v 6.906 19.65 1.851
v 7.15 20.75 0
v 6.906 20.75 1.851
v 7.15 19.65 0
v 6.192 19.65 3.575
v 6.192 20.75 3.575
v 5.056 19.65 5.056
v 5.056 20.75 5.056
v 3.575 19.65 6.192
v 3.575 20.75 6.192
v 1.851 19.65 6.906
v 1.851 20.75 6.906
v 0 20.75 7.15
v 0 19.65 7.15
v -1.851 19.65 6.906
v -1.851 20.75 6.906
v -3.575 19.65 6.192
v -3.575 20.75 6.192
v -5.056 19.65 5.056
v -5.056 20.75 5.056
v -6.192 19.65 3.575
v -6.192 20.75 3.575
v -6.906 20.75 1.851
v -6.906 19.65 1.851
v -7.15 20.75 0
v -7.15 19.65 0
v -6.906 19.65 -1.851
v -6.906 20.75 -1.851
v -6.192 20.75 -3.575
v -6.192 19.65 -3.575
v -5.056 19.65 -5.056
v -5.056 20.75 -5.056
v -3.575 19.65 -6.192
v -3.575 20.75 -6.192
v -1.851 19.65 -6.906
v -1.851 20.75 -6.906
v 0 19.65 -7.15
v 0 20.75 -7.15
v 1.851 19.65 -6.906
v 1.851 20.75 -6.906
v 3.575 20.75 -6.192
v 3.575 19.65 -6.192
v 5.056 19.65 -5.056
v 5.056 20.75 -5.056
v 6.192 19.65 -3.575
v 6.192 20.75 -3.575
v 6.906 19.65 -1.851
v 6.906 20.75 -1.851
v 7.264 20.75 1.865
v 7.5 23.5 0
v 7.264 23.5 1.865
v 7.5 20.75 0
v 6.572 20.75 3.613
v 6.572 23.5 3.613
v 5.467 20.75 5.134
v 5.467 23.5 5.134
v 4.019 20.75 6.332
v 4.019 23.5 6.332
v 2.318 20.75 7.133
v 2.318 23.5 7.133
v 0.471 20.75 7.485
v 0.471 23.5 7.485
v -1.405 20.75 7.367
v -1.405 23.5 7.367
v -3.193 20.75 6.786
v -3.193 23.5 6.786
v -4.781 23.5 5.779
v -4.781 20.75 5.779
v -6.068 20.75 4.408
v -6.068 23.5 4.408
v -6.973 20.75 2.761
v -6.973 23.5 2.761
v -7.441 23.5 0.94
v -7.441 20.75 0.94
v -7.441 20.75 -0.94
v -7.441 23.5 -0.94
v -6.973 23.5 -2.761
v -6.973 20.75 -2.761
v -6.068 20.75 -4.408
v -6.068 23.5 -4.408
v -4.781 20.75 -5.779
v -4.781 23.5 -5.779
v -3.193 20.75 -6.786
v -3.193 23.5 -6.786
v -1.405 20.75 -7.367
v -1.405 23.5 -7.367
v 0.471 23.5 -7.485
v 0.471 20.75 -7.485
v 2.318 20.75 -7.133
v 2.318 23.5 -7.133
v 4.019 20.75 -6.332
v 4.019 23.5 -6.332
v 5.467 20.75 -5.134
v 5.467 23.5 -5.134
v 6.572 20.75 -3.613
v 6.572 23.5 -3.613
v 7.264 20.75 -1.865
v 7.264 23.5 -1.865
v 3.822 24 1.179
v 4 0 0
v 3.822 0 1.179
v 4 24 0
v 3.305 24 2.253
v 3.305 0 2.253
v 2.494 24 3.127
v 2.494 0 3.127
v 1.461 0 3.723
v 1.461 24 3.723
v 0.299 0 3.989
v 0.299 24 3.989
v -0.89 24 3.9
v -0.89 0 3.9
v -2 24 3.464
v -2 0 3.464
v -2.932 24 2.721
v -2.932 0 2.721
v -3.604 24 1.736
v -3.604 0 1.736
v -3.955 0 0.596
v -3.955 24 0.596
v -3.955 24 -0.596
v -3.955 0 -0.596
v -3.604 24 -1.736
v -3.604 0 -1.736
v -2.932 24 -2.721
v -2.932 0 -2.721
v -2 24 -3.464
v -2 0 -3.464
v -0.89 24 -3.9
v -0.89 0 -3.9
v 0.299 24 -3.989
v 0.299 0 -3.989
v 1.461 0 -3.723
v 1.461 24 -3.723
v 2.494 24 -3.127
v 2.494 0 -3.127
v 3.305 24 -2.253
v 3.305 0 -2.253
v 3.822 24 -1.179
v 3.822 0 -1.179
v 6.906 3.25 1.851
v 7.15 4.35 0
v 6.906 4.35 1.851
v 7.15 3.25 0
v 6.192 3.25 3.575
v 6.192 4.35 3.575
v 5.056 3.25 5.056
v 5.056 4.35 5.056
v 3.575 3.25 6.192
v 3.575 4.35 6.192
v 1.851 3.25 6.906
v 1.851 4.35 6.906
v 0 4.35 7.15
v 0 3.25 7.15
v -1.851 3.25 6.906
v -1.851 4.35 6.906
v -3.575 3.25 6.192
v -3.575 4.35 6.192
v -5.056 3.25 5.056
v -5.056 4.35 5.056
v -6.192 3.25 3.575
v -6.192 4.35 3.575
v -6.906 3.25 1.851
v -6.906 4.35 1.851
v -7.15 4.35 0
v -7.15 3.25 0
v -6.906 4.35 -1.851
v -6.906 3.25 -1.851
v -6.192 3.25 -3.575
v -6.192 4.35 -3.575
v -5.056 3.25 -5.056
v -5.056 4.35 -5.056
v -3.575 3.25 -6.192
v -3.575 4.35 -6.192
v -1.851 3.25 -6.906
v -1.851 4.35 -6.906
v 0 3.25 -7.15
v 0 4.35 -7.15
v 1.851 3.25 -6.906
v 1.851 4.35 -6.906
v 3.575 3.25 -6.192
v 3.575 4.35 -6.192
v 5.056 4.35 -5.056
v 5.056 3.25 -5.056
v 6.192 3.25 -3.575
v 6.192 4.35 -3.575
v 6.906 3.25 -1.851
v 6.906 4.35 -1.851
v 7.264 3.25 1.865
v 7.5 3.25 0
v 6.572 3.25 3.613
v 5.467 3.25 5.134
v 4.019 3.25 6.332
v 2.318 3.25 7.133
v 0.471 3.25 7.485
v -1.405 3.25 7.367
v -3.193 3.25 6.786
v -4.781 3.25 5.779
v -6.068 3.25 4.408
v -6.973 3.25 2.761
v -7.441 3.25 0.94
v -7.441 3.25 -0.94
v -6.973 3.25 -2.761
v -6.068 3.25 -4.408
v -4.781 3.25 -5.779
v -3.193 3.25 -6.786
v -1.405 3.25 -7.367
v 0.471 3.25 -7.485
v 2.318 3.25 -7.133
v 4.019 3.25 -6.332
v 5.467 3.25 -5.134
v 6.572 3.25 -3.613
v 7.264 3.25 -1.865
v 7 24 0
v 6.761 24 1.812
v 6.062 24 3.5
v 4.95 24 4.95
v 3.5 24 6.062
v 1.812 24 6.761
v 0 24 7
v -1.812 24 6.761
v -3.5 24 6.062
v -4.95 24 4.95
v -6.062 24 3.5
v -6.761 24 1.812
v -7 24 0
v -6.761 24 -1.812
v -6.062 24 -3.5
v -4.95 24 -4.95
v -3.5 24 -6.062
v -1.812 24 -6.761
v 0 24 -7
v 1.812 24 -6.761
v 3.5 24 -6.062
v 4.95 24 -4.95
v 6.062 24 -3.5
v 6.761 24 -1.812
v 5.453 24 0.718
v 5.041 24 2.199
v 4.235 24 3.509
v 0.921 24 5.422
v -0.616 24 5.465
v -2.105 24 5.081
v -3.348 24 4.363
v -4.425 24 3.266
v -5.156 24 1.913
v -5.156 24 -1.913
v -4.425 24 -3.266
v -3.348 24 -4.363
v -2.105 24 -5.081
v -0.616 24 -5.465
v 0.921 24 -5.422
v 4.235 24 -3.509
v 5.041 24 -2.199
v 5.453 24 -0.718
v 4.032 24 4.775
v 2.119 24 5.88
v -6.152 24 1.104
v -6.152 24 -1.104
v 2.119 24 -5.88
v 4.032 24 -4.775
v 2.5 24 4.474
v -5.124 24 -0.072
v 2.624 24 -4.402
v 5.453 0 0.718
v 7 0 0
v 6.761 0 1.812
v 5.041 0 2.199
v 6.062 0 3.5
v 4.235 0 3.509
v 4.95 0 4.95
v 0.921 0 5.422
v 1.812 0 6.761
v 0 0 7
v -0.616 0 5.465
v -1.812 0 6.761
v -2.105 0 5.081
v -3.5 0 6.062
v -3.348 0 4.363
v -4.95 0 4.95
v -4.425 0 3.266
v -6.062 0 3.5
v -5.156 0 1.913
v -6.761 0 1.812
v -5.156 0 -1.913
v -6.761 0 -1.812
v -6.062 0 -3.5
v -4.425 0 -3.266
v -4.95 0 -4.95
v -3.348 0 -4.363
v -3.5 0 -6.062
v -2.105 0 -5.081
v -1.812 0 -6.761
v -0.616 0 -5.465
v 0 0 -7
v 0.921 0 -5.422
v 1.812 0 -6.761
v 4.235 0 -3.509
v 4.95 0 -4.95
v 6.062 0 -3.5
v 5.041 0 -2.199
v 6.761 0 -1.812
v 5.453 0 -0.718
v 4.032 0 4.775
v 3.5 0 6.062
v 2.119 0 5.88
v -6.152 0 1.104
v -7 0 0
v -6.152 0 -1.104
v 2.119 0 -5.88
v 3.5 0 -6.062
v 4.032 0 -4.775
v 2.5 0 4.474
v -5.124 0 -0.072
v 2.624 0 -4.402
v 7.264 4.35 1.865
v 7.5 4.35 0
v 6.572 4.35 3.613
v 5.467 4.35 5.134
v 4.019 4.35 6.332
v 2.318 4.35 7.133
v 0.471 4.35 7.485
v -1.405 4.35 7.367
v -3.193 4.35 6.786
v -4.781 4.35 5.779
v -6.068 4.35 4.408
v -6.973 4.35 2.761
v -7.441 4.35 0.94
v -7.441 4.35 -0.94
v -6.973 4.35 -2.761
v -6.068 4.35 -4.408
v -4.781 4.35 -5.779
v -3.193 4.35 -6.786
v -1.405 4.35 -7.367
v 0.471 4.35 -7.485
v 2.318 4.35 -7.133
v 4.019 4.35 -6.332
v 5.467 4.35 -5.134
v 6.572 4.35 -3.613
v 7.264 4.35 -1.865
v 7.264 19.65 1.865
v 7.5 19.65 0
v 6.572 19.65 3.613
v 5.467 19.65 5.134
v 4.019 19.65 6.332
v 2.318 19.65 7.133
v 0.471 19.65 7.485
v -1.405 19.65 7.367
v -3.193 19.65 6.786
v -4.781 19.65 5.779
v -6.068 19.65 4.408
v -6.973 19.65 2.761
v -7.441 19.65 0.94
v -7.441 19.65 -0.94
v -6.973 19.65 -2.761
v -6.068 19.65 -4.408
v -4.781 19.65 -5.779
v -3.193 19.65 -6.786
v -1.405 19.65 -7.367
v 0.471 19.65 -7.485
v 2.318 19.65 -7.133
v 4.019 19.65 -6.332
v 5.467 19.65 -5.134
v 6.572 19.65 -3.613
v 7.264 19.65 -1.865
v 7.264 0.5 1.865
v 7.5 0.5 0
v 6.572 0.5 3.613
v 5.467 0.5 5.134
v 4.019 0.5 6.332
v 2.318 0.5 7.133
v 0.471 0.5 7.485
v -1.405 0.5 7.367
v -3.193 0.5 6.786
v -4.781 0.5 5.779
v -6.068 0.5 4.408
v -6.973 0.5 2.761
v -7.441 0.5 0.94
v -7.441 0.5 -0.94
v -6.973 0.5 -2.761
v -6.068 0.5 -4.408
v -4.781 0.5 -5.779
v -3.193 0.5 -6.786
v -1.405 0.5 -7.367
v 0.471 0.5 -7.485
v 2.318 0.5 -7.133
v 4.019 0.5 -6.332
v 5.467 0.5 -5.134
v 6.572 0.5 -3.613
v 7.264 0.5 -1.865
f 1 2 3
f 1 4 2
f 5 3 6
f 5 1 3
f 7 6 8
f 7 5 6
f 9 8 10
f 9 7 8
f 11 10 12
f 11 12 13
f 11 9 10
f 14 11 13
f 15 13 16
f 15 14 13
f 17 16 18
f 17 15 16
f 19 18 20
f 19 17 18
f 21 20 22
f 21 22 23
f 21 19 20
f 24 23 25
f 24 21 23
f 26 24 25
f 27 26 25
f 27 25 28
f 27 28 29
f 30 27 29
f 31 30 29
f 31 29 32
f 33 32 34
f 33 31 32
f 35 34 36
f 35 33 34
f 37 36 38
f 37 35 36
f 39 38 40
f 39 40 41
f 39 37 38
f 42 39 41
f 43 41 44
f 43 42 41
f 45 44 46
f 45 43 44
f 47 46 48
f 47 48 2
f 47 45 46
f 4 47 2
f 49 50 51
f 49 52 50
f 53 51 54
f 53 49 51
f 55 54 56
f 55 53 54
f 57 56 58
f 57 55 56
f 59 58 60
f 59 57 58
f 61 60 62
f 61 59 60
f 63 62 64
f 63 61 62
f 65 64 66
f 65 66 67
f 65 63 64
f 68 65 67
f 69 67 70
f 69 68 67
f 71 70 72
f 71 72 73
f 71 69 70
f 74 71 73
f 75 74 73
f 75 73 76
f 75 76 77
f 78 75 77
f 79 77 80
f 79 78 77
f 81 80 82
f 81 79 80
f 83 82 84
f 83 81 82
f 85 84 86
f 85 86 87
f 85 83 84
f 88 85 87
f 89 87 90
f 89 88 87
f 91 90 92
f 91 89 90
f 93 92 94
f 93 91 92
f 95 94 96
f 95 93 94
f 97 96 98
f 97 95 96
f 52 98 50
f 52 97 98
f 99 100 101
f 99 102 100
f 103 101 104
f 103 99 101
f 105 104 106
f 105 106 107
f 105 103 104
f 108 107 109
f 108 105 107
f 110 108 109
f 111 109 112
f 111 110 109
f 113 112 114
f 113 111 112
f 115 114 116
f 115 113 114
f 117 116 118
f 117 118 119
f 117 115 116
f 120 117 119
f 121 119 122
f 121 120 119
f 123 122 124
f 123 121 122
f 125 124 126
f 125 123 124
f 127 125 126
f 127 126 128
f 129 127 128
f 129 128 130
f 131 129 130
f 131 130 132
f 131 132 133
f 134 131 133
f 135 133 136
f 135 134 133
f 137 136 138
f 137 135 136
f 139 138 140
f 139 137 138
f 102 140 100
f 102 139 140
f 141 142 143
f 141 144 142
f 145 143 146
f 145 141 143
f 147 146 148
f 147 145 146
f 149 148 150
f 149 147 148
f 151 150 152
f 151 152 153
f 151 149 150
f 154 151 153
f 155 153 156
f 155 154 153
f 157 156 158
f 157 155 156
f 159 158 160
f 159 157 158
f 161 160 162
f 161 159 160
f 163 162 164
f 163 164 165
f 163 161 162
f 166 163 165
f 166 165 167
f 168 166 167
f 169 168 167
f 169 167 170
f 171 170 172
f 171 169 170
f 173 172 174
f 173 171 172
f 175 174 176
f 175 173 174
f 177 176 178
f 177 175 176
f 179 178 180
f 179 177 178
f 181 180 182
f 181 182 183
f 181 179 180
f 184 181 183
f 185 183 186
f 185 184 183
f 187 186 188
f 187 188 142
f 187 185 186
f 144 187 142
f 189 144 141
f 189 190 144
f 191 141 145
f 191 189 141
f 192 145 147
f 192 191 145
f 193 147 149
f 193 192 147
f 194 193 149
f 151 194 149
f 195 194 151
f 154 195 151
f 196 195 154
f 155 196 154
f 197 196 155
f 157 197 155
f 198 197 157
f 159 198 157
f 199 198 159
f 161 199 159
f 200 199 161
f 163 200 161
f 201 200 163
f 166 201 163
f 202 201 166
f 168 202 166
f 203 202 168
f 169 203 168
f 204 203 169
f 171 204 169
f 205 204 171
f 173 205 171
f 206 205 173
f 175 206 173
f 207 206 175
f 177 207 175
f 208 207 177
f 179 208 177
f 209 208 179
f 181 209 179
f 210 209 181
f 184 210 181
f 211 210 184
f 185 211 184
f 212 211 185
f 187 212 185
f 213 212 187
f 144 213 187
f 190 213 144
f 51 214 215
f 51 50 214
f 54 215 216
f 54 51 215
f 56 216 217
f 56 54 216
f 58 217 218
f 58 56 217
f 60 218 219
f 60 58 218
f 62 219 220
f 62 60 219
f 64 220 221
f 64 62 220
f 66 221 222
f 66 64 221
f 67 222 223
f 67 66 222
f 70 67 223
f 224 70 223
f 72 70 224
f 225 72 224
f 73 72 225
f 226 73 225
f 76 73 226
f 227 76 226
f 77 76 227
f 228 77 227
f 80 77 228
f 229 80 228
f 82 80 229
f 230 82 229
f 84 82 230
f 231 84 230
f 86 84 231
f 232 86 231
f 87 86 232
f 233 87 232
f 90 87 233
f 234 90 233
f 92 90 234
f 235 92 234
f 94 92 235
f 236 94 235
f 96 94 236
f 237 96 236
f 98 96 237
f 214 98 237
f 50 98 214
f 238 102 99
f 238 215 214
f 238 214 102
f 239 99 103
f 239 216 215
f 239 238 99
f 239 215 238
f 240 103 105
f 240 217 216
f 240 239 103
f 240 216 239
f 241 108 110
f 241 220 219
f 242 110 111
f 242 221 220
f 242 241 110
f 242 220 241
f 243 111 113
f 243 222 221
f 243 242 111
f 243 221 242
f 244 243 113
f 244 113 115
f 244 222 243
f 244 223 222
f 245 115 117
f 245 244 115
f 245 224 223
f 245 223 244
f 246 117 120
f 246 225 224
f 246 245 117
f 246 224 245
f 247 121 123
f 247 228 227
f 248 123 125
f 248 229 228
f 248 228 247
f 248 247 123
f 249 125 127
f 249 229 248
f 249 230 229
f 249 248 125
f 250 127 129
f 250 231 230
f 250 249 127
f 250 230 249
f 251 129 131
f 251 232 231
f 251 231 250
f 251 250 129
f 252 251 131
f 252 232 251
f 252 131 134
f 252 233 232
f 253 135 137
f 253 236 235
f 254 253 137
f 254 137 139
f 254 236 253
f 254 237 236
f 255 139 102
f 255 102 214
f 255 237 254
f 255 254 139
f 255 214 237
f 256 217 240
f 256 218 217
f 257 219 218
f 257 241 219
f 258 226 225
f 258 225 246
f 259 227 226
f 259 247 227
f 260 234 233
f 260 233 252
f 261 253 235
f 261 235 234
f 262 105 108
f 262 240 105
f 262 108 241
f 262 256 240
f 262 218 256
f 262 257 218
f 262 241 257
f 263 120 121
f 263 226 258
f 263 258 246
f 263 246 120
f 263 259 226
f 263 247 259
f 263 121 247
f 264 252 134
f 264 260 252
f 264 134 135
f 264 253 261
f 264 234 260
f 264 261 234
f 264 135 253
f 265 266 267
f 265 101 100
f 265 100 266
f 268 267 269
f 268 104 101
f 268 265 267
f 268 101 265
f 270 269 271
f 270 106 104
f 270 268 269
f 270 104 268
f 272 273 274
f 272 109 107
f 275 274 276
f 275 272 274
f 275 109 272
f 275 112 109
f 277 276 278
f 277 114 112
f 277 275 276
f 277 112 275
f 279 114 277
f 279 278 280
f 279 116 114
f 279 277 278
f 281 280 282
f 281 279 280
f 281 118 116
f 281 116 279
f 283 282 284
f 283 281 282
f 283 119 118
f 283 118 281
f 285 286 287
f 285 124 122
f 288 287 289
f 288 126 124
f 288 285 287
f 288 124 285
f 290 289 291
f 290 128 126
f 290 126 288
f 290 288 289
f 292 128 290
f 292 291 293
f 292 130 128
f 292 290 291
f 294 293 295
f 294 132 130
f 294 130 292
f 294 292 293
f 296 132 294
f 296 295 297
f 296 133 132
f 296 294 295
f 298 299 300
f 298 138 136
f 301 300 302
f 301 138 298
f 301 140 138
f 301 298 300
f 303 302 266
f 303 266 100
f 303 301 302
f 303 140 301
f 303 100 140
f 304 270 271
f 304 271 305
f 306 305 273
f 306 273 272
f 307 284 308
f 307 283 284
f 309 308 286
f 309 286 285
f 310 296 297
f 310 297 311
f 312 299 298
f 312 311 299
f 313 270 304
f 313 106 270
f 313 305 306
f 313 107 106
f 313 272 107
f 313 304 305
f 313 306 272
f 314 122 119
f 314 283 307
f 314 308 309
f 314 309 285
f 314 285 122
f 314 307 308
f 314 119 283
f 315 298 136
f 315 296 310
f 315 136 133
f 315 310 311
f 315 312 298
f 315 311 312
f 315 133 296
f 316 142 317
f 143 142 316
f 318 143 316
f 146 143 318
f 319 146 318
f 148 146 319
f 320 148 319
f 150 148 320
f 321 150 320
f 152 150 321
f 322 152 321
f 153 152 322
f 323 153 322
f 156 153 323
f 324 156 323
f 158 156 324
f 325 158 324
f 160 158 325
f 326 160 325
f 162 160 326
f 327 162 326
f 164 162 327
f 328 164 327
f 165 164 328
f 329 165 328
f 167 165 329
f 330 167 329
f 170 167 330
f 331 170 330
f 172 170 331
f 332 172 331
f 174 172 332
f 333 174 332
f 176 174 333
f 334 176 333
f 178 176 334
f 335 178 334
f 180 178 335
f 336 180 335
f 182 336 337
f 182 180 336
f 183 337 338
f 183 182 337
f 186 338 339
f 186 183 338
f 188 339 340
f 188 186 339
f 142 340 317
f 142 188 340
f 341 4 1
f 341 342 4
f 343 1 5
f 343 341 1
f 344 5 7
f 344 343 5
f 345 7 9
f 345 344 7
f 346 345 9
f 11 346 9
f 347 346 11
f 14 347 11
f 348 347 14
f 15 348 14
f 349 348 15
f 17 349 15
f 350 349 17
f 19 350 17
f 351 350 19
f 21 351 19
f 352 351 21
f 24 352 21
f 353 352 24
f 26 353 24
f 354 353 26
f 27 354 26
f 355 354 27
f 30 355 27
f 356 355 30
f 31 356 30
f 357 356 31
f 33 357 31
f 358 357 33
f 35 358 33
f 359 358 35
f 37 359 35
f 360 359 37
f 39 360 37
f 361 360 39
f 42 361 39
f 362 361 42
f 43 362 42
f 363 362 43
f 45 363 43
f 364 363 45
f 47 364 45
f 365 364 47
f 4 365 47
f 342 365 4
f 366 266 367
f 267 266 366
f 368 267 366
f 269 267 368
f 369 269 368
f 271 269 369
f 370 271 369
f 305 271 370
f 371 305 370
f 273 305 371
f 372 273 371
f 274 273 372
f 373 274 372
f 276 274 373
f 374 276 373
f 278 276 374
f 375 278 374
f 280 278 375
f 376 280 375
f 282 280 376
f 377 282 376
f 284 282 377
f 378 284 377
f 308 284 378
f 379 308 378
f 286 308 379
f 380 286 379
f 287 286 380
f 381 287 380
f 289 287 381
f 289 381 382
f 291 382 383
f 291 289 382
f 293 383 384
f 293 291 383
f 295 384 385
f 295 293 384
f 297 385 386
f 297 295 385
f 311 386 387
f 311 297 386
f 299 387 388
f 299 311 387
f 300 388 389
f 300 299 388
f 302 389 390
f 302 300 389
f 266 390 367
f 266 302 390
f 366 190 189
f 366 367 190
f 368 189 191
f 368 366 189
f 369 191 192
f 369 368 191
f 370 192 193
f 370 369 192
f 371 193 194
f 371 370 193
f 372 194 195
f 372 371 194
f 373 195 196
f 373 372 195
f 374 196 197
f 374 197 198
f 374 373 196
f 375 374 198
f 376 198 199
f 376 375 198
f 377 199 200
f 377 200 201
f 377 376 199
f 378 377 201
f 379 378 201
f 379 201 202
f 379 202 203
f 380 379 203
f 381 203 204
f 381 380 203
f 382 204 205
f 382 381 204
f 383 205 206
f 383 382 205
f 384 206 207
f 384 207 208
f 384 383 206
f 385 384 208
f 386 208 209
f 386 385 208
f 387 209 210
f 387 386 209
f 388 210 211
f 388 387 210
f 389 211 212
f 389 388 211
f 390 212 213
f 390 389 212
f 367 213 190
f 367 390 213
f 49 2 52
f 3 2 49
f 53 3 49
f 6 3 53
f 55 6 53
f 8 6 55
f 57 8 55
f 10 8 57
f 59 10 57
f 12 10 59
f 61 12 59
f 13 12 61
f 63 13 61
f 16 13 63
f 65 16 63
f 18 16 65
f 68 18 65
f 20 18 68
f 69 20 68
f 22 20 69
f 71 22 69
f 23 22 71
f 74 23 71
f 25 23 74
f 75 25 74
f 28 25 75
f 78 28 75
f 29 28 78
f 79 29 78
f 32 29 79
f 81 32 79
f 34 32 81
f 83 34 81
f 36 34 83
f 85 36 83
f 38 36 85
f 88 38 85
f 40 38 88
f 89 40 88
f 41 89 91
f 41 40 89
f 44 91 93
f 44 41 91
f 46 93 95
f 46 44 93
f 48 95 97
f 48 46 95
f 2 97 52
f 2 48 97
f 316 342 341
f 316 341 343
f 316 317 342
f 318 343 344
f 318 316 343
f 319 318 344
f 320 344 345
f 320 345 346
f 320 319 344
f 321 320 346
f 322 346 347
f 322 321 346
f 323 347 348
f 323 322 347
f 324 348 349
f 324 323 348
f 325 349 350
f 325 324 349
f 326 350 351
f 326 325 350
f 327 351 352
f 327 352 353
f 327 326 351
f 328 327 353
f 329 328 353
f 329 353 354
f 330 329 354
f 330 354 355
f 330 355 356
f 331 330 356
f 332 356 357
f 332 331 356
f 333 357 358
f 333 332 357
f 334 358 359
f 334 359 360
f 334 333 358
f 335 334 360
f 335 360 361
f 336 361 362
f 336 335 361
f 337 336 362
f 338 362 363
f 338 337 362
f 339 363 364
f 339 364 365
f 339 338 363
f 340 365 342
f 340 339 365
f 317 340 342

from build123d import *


with BuildPart() as f2:
    # F2: sweep along a path in F0
    with BuildLine(Plane.XZ) as f2_path:
        CenterArc((0, 0), 4, 0, 360)
    # F1 (on Right) → F2 (sweep)
    with BuildSketch(Plane.YZ):
        Polygon((0, 7), (0, 4), (24, 4), (24, 7), (23.5, 7.5), (20.75, 7.5), (20.75, 7.15), (19.65, 7.15), (19.65, 7.5), (12, 7.5), (4.35, 7.5), (4.35, 7.15), (3.25, 7.15), (3.25, 7.5), (0.5, 7.5), align=None)
    sweep(path=f2_path.line)


solid = f2.part
